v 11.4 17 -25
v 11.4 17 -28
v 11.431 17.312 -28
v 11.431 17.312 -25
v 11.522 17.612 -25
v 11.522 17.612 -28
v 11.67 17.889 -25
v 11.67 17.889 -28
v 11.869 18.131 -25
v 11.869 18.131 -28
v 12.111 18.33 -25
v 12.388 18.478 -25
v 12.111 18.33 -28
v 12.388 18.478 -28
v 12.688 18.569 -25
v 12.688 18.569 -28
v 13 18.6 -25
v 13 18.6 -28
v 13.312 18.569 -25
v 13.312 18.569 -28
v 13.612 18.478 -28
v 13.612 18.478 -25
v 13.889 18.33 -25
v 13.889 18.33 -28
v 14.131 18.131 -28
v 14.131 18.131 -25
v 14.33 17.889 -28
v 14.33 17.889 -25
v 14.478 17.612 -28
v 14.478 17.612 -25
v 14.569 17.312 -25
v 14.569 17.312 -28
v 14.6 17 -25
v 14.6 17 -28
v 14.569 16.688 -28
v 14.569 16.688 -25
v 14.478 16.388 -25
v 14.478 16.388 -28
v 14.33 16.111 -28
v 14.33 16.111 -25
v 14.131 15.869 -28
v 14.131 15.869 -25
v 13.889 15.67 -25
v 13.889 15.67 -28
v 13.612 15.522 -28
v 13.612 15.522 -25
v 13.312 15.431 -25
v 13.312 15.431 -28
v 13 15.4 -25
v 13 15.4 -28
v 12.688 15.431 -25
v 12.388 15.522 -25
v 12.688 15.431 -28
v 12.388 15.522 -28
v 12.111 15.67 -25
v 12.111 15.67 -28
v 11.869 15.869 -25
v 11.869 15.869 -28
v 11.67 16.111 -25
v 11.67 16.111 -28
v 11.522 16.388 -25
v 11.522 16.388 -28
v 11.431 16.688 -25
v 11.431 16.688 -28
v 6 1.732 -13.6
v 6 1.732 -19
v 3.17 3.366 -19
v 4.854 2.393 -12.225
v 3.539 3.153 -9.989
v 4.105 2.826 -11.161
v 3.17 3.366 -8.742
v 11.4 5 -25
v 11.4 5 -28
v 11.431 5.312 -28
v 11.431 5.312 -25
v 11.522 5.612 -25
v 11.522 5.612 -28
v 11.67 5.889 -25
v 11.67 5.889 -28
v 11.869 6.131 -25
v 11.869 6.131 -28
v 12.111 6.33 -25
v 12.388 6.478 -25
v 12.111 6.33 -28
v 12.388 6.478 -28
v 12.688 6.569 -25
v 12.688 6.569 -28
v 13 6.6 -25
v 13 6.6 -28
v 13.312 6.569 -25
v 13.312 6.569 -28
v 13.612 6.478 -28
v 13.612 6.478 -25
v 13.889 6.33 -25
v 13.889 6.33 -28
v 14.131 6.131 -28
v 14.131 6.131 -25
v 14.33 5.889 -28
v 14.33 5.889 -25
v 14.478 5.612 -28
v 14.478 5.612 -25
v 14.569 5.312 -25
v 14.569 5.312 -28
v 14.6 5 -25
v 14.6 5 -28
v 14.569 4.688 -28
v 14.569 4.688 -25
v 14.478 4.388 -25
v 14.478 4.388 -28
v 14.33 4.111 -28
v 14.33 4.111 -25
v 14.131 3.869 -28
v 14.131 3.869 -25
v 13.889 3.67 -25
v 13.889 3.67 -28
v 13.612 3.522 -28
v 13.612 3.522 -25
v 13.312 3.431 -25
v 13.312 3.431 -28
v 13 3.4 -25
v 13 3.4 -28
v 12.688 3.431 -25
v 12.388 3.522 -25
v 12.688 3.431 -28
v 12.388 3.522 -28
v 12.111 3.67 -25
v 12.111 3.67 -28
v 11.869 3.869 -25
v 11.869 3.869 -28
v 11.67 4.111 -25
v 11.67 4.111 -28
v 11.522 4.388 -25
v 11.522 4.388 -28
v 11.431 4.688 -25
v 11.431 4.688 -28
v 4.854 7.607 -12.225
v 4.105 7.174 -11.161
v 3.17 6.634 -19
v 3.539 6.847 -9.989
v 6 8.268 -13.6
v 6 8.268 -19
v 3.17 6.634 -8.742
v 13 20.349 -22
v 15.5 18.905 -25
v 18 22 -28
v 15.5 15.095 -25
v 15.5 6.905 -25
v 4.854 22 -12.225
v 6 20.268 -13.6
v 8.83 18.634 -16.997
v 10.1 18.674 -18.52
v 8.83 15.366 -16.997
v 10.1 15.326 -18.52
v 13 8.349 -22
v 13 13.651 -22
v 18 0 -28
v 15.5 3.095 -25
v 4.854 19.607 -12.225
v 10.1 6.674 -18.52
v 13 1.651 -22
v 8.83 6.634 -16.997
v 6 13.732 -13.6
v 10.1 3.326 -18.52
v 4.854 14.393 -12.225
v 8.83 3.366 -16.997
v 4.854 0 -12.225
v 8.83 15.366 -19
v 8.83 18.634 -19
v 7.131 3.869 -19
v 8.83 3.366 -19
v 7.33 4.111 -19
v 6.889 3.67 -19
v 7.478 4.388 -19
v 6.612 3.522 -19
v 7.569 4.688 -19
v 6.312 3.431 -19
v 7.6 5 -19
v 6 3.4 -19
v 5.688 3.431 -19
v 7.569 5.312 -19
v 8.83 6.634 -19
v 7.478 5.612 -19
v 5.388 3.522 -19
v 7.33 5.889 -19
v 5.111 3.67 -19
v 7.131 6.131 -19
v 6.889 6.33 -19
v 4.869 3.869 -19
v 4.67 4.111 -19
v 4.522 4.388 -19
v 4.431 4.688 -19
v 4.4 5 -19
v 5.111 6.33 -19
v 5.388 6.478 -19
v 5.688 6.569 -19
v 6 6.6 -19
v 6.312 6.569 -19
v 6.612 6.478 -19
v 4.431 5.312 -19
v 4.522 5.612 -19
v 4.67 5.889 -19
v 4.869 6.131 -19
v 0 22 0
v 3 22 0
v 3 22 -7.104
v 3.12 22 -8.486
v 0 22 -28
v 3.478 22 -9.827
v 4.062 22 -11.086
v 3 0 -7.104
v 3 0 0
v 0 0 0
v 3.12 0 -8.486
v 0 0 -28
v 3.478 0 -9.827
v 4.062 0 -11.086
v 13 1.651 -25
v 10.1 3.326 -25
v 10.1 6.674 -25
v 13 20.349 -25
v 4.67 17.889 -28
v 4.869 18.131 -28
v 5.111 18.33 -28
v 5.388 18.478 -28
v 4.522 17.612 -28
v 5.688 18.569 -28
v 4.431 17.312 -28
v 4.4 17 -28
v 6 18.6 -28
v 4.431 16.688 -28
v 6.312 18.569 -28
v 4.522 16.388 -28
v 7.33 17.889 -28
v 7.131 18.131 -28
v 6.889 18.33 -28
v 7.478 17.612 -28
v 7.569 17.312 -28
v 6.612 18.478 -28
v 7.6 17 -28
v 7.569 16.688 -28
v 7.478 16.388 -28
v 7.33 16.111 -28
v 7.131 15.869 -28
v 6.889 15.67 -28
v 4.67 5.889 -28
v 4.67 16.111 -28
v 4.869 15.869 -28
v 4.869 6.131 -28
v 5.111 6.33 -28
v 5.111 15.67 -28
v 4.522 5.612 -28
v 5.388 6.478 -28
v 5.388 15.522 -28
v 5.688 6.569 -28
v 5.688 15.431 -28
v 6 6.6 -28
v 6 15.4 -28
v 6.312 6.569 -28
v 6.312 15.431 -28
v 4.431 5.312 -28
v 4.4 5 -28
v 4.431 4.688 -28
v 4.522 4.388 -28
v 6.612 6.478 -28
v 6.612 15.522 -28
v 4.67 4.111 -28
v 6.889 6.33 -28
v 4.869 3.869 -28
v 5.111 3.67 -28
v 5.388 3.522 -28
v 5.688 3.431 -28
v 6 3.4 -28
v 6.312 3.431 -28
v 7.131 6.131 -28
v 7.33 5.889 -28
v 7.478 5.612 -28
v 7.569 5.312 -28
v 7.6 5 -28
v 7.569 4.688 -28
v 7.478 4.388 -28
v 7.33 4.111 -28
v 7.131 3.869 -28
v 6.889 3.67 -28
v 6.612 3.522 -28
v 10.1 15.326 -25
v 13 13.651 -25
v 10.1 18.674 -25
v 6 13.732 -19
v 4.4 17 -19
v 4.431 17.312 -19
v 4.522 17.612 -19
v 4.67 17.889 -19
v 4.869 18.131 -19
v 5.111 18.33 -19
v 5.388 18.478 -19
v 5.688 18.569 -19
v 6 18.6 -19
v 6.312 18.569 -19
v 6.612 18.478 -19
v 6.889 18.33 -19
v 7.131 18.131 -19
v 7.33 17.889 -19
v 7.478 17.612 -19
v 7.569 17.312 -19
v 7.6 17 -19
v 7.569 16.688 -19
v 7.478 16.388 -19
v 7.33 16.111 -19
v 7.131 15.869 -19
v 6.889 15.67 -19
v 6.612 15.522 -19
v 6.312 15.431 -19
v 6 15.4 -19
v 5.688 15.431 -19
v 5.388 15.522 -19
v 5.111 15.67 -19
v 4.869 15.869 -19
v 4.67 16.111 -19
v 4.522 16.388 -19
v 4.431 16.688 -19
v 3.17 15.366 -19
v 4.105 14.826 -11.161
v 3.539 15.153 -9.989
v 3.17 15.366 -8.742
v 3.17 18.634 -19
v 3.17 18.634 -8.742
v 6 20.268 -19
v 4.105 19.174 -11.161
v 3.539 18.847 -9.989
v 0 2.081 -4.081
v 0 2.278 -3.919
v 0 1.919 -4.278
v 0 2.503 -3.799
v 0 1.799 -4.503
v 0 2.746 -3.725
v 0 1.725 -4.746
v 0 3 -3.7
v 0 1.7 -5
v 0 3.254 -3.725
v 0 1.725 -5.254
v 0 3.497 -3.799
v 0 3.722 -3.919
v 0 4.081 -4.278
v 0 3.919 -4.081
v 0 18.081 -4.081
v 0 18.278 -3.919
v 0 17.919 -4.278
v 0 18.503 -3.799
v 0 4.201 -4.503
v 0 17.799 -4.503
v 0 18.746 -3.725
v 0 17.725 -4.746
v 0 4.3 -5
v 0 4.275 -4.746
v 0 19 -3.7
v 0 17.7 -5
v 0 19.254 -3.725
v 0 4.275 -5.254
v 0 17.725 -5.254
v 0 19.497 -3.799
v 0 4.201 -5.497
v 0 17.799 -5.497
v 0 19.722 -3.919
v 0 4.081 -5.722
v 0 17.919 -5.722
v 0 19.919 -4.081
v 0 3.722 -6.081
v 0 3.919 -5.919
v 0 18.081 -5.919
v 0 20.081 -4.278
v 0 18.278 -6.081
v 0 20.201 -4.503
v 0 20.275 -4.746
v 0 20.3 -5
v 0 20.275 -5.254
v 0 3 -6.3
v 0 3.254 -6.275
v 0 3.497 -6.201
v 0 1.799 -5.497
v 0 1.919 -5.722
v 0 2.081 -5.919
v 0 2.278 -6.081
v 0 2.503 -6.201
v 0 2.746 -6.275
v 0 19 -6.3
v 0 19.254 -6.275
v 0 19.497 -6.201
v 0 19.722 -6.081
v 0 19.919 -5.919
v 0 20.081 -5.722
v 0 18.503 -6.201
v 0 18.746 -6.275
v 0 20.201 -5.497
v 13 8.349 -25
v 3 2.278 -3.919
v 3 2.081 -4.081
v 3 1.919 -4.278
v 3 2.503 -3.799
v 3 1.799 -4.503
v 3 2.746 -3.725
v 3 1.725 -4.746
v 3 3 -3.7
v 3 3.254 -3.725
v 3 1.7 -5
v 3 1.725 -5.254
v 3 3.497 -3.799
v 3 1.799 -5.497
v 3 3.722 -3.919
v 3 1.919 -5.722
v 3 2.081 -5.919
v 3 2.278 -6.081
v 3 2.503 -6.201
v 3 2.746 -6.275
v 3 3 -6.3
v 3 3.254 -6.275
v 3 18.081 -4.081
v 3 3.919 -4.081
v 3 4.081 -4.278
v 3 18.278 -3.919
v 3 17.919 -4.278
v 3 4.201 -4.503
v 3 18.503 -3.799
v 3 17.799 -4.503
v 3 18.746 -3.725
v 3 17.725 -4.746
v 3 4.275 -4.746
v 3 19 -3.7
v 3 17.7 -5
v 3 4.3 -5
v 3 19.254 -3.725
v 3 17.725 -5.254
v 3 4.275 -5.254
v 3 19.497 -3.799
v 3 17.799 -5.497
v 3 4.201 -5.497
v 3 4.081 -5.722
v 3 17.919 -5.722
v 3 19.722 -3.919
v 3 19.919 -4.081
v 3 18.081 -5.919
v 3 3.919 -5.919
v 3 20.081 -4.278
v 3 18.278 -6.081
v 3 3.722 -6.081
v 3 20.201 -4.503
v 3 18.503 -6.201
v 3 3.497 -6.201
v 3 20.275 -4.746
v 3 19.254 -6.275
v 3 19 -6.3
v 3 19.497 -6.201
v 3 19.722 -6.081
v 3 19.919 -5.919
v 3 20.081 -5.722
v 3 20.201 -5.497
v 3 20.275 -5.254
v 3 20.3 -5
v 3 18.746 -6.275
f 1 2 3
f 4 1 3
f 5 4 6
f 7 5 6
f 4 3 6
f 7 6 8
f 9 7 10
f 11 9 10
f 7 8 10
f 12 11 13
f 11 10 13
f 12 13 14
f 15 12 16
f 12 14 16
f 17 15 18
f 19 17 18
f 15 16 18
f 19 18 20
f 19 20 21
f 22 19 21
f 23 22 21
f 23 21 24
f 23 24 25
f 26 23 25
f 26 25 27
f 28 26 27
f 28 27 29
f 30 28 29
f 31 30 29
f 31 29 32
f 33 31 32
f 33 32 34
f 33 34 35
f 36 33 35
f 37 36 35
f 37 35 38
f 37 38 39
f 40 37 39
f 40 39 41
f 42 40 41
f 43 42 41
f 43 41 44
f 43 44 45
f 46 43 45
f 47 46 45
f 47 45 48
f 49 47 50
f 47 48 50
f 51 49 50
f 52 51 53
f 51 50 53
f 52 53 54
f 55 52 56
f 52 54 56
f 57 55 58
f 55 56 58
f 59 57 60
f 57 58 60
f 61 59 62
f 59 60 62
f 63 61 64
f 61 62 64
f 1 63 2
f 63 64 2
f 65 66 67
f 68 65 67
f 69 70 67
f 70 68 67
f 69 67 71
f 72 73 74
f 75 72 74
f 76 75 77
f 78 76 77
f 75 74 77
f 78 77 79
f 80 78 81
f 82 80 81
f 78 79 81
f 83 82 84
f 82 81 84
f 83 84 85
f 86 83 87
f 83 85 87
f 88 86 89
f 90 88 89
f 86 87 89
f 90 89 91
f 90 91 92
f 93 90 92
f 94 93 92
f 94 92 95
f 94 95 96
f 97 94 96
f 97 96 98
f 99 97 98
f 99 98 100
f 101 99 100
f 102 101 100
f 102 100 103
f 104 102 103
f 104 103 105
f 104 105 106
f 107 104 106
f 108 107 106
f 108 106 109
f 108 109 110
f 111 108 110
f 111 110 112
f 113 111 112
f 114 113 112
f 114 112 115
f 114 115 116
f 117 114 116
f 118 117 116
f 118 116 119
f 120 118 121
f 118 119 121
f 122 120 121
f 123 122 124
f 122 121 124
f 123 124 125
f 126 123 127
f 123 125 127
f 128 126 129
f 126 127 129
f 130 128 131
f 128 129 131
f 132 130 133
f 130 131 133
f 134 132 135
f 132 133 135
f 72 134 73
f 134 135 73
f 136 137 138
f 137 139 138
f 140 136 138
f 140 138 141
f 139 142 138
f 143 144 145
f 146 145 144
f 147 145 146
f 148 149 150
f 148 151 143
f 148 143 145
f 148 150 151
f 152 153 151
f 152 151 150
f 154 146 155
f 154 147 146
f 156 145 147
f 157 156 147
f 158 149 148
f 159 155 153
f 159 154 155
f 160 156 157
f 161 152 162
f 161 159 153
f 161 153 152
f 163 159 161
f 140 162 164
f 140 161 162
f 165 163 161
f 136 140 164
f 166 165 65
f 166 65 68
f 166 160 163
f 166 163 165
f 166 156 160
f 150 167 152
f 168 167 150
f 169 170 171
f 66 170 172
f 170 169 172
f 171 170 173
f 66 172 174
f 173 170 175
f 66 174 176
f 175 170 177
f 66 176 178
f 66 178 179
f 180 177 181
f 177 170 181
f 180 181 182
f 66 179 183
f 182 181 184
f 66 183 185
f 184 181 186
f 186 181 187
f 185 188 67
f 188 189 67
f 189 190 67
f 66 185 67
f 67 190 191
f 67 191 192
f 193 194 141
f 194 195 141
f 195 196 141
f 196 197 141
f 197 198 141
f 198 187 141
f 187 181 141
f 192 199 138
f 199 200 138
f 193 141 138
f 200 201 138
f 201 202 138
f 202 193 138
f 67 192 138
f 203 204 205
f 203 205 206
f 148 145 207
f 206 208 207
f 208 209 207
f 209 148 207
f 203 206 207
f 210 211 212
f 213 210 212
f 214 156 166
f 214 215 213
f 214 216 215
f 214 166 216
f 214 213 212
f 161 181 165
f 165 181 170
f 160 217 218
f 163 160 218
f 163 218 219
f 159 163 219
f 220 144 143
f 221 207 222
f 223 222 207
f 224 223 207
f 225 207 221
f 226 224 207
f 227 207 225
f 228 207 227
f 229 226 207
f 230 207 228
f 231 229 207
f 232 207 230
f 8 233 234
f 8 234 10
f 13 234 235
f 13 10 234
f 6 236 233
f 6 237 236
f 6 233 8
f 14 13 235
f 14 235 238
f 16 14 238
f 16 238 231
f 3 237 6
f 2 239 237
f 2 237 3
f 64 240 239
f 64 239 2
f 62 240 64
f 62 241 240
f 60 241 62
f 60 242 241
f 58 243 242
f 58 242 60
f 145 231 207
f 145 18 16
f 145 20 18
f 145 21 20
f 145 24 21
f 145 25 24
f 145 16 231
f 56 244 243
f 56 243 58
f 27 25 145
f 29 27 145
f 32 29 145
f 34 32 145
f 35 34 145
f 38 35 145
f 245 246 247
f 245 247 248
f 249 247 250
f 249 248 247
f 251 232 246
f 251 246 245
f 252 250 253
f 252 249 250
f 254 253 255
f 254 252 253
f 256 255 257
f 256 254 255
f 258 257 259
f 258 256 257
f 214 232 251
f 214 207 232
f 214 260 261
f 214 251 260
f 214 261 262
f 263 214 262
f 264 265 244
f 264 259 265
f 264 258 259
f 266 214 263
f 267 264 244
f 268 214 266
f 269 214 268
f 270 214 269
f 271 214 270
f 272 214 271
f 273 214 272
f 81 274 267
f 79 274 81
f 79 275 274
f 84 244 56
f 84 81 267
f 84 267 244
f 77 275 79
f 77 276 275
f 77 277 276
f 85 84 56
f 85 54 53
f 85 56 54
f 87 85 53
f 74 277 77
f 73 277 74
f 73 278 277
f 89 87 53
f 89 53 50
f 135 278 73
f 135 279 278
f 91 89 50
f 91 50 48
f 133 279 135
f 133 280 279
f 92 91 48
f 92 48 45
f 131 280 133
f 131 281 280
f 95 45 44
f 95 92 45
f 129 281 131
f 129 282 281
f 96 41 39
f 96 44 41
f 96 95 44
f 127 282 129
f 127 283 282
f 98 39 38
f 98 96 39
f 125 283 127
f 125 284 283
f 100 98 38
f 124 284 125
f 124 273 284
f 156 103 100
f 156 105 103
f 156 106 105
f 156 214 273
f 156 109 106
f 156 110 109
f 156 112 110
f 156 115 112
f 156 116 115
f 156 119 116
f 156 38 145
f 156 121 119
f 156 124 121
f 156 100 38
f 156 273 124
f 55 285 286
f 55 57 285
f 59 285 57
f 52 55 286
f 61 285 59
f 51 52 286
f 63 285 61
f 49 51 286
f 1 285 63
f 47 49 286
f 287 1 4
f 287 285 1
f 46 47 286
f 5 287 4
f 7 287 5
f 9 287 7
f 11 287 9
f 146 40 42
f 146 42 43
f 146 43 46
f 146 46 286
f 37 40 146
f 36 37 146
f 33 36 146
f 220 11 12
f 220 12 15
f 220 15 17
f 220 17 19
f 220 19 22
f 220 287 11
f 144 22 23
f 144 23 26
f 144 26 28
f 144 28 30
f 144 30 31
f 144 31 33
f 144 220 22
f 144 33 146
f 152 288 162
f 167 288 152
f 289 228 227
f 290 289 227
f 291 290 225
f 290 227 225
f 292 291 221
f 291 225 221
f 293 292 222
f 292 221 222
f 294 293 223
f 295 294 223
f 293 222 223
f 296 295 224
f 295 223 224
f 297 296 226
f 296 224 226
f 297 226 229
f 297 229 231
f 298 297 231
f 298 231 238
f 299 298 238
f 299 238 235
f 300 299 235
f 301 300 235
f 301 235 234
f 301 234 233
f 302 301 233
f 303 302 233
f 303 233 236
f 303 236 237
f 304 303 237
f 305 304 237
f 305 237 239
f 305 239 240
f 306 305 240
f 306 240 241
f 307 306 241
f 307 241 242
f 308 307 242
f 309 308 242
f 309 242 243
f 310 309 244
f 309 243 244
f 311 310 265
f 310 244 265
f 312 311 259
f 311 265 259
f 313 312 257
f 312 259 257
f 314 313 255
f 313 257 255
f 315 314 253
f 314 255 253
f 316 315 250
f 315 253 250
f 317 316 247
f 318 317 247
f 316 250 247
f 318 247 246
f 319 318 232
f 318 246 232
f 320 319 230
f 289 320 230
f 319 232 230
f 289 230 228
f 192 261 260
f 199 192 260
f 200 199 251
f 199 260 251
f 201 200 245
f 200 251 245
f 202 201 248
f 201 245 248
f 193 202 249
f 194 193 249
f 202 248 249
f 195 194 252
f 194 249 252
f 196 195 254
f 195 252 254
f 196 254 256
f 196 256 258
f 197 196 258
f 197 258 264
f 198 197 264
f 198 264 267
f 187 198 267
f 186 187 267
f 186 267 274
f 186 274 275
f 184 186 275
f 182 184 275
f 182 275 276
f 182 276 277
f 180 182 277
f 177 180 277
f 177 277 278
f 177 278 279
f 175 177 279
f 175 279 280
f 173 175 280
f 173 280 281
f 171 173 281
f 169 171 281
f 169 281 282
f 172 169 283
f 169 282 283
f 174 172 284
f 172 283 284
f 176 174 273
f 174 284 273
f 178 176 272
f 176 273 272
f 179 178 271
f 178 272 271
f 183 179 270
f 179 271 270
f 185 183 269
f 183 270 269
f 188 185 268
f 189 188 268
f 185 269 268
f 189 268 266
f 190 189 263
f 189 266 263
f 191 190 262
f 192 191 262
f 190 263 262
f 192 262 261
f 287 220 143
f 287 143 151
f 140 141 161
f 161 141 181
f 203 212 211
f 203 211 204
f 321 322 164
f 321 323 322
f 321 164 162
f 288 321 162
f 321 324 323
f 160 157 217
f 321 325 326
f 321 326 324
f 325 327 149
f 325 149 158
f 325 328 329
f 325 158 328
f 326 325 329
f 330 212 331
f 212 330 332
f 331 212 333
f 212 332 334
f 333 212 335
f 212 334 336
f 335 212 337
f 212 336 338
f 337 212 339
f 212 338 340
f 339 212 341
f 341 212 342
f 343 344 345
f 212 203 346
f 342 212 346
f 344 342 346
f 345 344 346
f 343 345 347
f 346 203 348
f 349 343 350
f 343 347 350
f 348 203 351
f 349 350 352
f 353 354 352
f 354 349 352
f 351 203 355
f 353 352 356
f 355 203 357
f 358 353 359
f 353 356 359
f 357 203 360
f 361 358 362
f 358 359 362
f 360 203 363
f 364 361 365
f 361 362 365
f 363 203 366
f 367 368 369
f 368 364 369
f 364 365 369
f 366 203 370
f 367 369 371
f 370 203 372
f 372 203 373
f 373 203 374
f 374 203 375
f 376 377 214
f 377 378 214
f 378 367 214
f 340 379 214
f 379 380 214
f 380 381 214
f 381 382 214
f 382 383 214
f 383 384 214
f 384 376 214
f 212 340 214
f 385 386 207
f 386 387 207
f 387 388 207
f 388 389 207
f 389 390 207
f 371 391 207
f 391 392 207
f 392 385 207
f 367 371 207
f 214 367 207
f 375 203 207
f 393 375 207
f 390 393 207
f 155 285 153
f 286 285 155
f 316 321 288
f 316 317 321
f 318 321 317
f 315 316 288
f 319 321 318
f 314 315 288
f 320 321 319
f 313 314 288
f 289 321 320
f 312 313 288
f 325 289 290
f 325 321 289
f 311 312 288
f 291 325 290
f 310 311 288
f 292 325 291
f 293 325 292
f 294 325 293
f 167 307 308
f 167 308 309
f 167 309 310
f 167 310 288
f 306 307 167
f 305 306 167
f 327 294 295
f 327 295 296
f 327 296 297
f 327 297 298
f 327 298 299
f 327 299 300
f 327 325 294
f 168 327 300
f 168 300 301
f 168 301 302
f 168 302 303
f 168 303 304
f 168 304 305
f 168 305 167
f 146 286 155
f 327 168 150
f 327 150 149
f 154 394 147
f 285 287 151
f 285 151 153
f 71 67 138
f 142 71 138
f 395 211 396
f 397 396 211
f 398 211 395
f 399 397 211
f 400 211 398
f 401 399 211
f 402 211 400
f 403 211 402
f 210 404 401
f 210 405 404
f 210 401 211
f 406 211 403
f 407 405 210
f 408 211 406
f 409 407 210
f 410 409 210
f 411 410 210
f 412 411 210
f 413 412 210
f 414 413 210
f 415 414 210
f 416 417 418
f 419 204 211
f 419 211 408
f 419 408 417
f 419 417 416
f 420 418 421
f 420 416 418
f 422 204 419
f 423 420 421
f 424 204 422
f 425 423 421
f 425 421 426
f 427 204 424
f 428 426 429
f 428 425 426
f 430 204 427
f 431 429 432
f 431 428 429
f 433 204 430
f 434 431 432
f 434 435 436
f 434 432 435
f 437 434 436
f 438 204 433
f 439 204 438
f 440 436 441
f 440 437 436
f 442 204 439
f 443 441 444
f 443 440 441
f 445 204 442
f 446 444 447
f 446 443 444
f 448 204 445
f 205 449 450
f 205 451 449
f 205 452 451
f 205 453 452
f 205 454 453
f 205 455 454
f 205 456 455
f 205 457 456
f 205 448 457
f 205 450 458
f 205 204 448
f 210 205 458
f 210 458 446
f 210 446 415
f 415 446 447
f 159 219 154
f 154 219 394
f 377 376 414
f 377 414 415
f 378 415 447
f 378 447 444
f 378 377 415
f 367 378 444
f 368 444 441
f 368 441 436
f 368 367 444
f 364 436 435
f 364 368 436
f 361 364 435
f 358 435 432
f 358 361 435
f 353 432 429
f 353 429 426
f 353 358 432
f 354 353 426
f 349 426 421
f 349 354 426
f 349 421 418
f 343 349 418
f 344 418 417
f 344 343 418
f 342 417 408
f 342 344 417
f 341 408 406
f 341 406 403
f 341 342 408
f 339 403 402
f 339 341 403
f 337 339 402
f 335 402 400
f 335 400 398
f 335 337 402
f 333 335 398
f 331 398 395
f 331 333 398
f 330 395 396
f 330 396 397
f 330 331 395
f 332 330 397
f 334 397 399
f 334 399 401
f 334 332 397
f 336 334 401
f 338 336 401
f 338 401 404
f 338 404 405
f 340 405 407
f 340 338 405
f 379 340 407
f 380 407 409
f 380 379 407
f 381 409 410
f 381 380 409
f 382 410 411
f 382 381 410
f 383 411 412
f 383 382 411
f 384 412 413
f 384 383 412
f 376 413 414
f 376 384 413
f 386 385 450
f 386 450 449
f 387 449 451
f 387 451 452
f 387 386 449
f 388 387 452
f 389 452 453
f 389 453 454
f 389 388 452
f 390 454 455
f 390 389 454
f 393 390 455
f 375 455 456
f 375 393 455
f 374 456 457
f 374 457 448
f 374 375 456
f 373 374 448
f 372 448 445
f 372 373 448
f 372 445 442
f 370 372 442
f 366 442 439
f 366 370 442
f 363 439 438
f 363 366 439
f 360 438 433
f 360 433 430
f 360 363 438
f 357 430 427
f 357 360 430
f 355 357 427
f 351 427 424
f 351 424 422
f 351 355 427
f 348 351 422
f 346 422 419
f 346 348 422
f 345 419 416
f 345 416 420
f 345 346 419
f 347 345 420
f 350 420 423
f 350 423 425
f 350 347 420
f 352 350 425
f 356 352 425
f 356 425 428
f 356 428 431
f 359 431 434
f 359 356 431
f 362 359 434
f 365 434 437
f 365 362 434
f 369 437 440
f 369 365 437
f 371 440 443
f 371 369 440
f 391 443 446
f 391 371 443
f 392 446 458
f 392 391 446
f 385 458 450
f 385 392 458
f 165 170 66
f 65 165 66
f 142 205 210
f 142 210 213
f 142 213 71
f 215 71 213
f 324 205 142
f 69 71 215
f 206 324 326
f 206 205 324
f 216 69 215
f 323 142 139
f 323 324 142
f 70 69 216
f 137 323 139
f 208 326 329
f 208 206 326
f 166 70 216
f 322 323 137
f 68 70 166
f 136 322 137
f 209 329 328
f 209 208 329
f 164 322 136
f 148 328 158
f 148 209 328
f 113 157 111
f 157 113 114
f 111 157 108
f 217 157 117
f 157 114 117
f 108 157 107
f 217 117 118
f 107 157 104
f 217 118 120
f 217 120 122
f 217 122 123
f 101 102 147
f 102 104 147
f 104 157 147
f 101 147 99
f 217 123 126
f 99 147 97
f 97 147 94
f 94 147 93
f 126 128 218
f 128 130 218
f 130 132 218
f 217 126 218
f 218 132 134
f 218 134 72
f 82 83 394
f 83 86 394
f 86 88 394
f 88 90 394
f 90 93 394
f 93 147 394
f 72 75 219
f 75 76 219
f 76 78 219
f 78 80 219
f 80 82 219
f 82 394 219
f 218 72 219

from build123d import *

# Parameters (mm, degrees)
SKETCH1_W           = 28
SKETCH1_H           = 22
SKETCH1_R           = 1.3
BOSS_EXTRUDE1_DEPTH = 3
BOSS_EXTRUDE3_DEPTH = 22
FILLET1_R           = 8
SKETCH4_R           = 1.6
CUT_EXTRUDE1_DEPTH  = 29
CUT_EXTRUDE2_DEPTH  = 20
CUT_EXTRUDE3_DEPTH  = 26


with BuildPart() as part:
    # Sketch1 → Boss-Extrude1 (new body)
    with BuildSketch(Plane(origin=(0, 0, 0), x_dir=(0, 0, -1), z_dir=(1, 0, 0))):
        with Locations((14, 11)):
            Rectangle(SKETCH1_W, SKETCH1_H)
        with Locations((5, 19)):
            Circle(SKETCH1_R, mode=Mode.SUBTRACT)
        with Locations((5, 3)):
            Circle(SKETCH1_R, mode=Mode.SUBTRACT)
    extrude(amount=BOSS_EXTRUDE1_DEPTH)

    # Sketch3 → Boss-Extrude3 (add)
    with BuildSketch(Plane(origin=(0, 0, 0), x_dir=(1, 0, 0), z_dir=(0, 1, 0))):
        Polygon((3, 28), (18, 28), (3, 10), align=None)
    extrude(amount=BOSS_EXTRUDE3_DEPTH)

    # Fillet1
    fillet1_edges = [part.edges().sort_by_distance(p)[0] for p in [
        (3, 11, -10),
    ]]
    fillet(fillet1_edges, radius=FILLET1_R)

    # Sketch4 → Cut-Extrude1 (cut, through all)
    with BuildSketch(Plane(origin=(0, 0, -28), x_dir=(-1, 0, 0), z_dir=(0, 0, -1))):
        with Locations((-6, 17)):
            Circle(SKETCH4_R)
        with Locations((-6, 5)):
            Circle(SKETCH4_R)
        with Locations((-13, 17)):
            Circle(SKETCH4_R)
        with Locations((-13, 5)):
            Circle(SKETCH4_R)
    extrude(amount=-CUT_EXTRUDE1_DEPTH, mode=Mode.SUBTRACT)

    # Sketch5 → Cut-Extrude2 (cut, through all)
    with BuildSketch(Plane.XY.offset(-19)):
        Polygon((3.169500163, 3.365810157), (3.169500163, 6.634189843), (6, 8.268379685), (8.830499837, 6.634189843), (8.830499837, 3.365810157), (6, 1.731620315), align=None)
        Polygon((3.169500163, 15.365810157), (6, 13.731620315), (8.830499837, 15.365810157), (8.830499837, 18.634189843), (6, 20.268379685), (3.169500163, 18.634189843), align=None)
    extrude(amount=CUT_EXTRUDE2_DEPTH, mode=Mode.SUBTRACT)

    # Sketch6 → Cut-Extrude3 (cut, through all)
    with BuildSketch(Plane.XY.offset(-25)):
        Polygon((10.1, 15.325684219), (13, 13.651368439), (15.9, 15.325684219), (15.9, 18.674315781), (13, 20.348631561), (10.1, 18.674315781), align=None)
        Polygon((10.1, 3.325684219), (10.1, 6.674315781), (13, 8.348631561), (15.9, 6.674315781), (15.9, 3.325684219), (13, 1.651368439), align=None)
    extrude(amount=CUT_EXTRUDE3_DEPTH, mode=Mode.SUBTRACT)


solid = part.part
